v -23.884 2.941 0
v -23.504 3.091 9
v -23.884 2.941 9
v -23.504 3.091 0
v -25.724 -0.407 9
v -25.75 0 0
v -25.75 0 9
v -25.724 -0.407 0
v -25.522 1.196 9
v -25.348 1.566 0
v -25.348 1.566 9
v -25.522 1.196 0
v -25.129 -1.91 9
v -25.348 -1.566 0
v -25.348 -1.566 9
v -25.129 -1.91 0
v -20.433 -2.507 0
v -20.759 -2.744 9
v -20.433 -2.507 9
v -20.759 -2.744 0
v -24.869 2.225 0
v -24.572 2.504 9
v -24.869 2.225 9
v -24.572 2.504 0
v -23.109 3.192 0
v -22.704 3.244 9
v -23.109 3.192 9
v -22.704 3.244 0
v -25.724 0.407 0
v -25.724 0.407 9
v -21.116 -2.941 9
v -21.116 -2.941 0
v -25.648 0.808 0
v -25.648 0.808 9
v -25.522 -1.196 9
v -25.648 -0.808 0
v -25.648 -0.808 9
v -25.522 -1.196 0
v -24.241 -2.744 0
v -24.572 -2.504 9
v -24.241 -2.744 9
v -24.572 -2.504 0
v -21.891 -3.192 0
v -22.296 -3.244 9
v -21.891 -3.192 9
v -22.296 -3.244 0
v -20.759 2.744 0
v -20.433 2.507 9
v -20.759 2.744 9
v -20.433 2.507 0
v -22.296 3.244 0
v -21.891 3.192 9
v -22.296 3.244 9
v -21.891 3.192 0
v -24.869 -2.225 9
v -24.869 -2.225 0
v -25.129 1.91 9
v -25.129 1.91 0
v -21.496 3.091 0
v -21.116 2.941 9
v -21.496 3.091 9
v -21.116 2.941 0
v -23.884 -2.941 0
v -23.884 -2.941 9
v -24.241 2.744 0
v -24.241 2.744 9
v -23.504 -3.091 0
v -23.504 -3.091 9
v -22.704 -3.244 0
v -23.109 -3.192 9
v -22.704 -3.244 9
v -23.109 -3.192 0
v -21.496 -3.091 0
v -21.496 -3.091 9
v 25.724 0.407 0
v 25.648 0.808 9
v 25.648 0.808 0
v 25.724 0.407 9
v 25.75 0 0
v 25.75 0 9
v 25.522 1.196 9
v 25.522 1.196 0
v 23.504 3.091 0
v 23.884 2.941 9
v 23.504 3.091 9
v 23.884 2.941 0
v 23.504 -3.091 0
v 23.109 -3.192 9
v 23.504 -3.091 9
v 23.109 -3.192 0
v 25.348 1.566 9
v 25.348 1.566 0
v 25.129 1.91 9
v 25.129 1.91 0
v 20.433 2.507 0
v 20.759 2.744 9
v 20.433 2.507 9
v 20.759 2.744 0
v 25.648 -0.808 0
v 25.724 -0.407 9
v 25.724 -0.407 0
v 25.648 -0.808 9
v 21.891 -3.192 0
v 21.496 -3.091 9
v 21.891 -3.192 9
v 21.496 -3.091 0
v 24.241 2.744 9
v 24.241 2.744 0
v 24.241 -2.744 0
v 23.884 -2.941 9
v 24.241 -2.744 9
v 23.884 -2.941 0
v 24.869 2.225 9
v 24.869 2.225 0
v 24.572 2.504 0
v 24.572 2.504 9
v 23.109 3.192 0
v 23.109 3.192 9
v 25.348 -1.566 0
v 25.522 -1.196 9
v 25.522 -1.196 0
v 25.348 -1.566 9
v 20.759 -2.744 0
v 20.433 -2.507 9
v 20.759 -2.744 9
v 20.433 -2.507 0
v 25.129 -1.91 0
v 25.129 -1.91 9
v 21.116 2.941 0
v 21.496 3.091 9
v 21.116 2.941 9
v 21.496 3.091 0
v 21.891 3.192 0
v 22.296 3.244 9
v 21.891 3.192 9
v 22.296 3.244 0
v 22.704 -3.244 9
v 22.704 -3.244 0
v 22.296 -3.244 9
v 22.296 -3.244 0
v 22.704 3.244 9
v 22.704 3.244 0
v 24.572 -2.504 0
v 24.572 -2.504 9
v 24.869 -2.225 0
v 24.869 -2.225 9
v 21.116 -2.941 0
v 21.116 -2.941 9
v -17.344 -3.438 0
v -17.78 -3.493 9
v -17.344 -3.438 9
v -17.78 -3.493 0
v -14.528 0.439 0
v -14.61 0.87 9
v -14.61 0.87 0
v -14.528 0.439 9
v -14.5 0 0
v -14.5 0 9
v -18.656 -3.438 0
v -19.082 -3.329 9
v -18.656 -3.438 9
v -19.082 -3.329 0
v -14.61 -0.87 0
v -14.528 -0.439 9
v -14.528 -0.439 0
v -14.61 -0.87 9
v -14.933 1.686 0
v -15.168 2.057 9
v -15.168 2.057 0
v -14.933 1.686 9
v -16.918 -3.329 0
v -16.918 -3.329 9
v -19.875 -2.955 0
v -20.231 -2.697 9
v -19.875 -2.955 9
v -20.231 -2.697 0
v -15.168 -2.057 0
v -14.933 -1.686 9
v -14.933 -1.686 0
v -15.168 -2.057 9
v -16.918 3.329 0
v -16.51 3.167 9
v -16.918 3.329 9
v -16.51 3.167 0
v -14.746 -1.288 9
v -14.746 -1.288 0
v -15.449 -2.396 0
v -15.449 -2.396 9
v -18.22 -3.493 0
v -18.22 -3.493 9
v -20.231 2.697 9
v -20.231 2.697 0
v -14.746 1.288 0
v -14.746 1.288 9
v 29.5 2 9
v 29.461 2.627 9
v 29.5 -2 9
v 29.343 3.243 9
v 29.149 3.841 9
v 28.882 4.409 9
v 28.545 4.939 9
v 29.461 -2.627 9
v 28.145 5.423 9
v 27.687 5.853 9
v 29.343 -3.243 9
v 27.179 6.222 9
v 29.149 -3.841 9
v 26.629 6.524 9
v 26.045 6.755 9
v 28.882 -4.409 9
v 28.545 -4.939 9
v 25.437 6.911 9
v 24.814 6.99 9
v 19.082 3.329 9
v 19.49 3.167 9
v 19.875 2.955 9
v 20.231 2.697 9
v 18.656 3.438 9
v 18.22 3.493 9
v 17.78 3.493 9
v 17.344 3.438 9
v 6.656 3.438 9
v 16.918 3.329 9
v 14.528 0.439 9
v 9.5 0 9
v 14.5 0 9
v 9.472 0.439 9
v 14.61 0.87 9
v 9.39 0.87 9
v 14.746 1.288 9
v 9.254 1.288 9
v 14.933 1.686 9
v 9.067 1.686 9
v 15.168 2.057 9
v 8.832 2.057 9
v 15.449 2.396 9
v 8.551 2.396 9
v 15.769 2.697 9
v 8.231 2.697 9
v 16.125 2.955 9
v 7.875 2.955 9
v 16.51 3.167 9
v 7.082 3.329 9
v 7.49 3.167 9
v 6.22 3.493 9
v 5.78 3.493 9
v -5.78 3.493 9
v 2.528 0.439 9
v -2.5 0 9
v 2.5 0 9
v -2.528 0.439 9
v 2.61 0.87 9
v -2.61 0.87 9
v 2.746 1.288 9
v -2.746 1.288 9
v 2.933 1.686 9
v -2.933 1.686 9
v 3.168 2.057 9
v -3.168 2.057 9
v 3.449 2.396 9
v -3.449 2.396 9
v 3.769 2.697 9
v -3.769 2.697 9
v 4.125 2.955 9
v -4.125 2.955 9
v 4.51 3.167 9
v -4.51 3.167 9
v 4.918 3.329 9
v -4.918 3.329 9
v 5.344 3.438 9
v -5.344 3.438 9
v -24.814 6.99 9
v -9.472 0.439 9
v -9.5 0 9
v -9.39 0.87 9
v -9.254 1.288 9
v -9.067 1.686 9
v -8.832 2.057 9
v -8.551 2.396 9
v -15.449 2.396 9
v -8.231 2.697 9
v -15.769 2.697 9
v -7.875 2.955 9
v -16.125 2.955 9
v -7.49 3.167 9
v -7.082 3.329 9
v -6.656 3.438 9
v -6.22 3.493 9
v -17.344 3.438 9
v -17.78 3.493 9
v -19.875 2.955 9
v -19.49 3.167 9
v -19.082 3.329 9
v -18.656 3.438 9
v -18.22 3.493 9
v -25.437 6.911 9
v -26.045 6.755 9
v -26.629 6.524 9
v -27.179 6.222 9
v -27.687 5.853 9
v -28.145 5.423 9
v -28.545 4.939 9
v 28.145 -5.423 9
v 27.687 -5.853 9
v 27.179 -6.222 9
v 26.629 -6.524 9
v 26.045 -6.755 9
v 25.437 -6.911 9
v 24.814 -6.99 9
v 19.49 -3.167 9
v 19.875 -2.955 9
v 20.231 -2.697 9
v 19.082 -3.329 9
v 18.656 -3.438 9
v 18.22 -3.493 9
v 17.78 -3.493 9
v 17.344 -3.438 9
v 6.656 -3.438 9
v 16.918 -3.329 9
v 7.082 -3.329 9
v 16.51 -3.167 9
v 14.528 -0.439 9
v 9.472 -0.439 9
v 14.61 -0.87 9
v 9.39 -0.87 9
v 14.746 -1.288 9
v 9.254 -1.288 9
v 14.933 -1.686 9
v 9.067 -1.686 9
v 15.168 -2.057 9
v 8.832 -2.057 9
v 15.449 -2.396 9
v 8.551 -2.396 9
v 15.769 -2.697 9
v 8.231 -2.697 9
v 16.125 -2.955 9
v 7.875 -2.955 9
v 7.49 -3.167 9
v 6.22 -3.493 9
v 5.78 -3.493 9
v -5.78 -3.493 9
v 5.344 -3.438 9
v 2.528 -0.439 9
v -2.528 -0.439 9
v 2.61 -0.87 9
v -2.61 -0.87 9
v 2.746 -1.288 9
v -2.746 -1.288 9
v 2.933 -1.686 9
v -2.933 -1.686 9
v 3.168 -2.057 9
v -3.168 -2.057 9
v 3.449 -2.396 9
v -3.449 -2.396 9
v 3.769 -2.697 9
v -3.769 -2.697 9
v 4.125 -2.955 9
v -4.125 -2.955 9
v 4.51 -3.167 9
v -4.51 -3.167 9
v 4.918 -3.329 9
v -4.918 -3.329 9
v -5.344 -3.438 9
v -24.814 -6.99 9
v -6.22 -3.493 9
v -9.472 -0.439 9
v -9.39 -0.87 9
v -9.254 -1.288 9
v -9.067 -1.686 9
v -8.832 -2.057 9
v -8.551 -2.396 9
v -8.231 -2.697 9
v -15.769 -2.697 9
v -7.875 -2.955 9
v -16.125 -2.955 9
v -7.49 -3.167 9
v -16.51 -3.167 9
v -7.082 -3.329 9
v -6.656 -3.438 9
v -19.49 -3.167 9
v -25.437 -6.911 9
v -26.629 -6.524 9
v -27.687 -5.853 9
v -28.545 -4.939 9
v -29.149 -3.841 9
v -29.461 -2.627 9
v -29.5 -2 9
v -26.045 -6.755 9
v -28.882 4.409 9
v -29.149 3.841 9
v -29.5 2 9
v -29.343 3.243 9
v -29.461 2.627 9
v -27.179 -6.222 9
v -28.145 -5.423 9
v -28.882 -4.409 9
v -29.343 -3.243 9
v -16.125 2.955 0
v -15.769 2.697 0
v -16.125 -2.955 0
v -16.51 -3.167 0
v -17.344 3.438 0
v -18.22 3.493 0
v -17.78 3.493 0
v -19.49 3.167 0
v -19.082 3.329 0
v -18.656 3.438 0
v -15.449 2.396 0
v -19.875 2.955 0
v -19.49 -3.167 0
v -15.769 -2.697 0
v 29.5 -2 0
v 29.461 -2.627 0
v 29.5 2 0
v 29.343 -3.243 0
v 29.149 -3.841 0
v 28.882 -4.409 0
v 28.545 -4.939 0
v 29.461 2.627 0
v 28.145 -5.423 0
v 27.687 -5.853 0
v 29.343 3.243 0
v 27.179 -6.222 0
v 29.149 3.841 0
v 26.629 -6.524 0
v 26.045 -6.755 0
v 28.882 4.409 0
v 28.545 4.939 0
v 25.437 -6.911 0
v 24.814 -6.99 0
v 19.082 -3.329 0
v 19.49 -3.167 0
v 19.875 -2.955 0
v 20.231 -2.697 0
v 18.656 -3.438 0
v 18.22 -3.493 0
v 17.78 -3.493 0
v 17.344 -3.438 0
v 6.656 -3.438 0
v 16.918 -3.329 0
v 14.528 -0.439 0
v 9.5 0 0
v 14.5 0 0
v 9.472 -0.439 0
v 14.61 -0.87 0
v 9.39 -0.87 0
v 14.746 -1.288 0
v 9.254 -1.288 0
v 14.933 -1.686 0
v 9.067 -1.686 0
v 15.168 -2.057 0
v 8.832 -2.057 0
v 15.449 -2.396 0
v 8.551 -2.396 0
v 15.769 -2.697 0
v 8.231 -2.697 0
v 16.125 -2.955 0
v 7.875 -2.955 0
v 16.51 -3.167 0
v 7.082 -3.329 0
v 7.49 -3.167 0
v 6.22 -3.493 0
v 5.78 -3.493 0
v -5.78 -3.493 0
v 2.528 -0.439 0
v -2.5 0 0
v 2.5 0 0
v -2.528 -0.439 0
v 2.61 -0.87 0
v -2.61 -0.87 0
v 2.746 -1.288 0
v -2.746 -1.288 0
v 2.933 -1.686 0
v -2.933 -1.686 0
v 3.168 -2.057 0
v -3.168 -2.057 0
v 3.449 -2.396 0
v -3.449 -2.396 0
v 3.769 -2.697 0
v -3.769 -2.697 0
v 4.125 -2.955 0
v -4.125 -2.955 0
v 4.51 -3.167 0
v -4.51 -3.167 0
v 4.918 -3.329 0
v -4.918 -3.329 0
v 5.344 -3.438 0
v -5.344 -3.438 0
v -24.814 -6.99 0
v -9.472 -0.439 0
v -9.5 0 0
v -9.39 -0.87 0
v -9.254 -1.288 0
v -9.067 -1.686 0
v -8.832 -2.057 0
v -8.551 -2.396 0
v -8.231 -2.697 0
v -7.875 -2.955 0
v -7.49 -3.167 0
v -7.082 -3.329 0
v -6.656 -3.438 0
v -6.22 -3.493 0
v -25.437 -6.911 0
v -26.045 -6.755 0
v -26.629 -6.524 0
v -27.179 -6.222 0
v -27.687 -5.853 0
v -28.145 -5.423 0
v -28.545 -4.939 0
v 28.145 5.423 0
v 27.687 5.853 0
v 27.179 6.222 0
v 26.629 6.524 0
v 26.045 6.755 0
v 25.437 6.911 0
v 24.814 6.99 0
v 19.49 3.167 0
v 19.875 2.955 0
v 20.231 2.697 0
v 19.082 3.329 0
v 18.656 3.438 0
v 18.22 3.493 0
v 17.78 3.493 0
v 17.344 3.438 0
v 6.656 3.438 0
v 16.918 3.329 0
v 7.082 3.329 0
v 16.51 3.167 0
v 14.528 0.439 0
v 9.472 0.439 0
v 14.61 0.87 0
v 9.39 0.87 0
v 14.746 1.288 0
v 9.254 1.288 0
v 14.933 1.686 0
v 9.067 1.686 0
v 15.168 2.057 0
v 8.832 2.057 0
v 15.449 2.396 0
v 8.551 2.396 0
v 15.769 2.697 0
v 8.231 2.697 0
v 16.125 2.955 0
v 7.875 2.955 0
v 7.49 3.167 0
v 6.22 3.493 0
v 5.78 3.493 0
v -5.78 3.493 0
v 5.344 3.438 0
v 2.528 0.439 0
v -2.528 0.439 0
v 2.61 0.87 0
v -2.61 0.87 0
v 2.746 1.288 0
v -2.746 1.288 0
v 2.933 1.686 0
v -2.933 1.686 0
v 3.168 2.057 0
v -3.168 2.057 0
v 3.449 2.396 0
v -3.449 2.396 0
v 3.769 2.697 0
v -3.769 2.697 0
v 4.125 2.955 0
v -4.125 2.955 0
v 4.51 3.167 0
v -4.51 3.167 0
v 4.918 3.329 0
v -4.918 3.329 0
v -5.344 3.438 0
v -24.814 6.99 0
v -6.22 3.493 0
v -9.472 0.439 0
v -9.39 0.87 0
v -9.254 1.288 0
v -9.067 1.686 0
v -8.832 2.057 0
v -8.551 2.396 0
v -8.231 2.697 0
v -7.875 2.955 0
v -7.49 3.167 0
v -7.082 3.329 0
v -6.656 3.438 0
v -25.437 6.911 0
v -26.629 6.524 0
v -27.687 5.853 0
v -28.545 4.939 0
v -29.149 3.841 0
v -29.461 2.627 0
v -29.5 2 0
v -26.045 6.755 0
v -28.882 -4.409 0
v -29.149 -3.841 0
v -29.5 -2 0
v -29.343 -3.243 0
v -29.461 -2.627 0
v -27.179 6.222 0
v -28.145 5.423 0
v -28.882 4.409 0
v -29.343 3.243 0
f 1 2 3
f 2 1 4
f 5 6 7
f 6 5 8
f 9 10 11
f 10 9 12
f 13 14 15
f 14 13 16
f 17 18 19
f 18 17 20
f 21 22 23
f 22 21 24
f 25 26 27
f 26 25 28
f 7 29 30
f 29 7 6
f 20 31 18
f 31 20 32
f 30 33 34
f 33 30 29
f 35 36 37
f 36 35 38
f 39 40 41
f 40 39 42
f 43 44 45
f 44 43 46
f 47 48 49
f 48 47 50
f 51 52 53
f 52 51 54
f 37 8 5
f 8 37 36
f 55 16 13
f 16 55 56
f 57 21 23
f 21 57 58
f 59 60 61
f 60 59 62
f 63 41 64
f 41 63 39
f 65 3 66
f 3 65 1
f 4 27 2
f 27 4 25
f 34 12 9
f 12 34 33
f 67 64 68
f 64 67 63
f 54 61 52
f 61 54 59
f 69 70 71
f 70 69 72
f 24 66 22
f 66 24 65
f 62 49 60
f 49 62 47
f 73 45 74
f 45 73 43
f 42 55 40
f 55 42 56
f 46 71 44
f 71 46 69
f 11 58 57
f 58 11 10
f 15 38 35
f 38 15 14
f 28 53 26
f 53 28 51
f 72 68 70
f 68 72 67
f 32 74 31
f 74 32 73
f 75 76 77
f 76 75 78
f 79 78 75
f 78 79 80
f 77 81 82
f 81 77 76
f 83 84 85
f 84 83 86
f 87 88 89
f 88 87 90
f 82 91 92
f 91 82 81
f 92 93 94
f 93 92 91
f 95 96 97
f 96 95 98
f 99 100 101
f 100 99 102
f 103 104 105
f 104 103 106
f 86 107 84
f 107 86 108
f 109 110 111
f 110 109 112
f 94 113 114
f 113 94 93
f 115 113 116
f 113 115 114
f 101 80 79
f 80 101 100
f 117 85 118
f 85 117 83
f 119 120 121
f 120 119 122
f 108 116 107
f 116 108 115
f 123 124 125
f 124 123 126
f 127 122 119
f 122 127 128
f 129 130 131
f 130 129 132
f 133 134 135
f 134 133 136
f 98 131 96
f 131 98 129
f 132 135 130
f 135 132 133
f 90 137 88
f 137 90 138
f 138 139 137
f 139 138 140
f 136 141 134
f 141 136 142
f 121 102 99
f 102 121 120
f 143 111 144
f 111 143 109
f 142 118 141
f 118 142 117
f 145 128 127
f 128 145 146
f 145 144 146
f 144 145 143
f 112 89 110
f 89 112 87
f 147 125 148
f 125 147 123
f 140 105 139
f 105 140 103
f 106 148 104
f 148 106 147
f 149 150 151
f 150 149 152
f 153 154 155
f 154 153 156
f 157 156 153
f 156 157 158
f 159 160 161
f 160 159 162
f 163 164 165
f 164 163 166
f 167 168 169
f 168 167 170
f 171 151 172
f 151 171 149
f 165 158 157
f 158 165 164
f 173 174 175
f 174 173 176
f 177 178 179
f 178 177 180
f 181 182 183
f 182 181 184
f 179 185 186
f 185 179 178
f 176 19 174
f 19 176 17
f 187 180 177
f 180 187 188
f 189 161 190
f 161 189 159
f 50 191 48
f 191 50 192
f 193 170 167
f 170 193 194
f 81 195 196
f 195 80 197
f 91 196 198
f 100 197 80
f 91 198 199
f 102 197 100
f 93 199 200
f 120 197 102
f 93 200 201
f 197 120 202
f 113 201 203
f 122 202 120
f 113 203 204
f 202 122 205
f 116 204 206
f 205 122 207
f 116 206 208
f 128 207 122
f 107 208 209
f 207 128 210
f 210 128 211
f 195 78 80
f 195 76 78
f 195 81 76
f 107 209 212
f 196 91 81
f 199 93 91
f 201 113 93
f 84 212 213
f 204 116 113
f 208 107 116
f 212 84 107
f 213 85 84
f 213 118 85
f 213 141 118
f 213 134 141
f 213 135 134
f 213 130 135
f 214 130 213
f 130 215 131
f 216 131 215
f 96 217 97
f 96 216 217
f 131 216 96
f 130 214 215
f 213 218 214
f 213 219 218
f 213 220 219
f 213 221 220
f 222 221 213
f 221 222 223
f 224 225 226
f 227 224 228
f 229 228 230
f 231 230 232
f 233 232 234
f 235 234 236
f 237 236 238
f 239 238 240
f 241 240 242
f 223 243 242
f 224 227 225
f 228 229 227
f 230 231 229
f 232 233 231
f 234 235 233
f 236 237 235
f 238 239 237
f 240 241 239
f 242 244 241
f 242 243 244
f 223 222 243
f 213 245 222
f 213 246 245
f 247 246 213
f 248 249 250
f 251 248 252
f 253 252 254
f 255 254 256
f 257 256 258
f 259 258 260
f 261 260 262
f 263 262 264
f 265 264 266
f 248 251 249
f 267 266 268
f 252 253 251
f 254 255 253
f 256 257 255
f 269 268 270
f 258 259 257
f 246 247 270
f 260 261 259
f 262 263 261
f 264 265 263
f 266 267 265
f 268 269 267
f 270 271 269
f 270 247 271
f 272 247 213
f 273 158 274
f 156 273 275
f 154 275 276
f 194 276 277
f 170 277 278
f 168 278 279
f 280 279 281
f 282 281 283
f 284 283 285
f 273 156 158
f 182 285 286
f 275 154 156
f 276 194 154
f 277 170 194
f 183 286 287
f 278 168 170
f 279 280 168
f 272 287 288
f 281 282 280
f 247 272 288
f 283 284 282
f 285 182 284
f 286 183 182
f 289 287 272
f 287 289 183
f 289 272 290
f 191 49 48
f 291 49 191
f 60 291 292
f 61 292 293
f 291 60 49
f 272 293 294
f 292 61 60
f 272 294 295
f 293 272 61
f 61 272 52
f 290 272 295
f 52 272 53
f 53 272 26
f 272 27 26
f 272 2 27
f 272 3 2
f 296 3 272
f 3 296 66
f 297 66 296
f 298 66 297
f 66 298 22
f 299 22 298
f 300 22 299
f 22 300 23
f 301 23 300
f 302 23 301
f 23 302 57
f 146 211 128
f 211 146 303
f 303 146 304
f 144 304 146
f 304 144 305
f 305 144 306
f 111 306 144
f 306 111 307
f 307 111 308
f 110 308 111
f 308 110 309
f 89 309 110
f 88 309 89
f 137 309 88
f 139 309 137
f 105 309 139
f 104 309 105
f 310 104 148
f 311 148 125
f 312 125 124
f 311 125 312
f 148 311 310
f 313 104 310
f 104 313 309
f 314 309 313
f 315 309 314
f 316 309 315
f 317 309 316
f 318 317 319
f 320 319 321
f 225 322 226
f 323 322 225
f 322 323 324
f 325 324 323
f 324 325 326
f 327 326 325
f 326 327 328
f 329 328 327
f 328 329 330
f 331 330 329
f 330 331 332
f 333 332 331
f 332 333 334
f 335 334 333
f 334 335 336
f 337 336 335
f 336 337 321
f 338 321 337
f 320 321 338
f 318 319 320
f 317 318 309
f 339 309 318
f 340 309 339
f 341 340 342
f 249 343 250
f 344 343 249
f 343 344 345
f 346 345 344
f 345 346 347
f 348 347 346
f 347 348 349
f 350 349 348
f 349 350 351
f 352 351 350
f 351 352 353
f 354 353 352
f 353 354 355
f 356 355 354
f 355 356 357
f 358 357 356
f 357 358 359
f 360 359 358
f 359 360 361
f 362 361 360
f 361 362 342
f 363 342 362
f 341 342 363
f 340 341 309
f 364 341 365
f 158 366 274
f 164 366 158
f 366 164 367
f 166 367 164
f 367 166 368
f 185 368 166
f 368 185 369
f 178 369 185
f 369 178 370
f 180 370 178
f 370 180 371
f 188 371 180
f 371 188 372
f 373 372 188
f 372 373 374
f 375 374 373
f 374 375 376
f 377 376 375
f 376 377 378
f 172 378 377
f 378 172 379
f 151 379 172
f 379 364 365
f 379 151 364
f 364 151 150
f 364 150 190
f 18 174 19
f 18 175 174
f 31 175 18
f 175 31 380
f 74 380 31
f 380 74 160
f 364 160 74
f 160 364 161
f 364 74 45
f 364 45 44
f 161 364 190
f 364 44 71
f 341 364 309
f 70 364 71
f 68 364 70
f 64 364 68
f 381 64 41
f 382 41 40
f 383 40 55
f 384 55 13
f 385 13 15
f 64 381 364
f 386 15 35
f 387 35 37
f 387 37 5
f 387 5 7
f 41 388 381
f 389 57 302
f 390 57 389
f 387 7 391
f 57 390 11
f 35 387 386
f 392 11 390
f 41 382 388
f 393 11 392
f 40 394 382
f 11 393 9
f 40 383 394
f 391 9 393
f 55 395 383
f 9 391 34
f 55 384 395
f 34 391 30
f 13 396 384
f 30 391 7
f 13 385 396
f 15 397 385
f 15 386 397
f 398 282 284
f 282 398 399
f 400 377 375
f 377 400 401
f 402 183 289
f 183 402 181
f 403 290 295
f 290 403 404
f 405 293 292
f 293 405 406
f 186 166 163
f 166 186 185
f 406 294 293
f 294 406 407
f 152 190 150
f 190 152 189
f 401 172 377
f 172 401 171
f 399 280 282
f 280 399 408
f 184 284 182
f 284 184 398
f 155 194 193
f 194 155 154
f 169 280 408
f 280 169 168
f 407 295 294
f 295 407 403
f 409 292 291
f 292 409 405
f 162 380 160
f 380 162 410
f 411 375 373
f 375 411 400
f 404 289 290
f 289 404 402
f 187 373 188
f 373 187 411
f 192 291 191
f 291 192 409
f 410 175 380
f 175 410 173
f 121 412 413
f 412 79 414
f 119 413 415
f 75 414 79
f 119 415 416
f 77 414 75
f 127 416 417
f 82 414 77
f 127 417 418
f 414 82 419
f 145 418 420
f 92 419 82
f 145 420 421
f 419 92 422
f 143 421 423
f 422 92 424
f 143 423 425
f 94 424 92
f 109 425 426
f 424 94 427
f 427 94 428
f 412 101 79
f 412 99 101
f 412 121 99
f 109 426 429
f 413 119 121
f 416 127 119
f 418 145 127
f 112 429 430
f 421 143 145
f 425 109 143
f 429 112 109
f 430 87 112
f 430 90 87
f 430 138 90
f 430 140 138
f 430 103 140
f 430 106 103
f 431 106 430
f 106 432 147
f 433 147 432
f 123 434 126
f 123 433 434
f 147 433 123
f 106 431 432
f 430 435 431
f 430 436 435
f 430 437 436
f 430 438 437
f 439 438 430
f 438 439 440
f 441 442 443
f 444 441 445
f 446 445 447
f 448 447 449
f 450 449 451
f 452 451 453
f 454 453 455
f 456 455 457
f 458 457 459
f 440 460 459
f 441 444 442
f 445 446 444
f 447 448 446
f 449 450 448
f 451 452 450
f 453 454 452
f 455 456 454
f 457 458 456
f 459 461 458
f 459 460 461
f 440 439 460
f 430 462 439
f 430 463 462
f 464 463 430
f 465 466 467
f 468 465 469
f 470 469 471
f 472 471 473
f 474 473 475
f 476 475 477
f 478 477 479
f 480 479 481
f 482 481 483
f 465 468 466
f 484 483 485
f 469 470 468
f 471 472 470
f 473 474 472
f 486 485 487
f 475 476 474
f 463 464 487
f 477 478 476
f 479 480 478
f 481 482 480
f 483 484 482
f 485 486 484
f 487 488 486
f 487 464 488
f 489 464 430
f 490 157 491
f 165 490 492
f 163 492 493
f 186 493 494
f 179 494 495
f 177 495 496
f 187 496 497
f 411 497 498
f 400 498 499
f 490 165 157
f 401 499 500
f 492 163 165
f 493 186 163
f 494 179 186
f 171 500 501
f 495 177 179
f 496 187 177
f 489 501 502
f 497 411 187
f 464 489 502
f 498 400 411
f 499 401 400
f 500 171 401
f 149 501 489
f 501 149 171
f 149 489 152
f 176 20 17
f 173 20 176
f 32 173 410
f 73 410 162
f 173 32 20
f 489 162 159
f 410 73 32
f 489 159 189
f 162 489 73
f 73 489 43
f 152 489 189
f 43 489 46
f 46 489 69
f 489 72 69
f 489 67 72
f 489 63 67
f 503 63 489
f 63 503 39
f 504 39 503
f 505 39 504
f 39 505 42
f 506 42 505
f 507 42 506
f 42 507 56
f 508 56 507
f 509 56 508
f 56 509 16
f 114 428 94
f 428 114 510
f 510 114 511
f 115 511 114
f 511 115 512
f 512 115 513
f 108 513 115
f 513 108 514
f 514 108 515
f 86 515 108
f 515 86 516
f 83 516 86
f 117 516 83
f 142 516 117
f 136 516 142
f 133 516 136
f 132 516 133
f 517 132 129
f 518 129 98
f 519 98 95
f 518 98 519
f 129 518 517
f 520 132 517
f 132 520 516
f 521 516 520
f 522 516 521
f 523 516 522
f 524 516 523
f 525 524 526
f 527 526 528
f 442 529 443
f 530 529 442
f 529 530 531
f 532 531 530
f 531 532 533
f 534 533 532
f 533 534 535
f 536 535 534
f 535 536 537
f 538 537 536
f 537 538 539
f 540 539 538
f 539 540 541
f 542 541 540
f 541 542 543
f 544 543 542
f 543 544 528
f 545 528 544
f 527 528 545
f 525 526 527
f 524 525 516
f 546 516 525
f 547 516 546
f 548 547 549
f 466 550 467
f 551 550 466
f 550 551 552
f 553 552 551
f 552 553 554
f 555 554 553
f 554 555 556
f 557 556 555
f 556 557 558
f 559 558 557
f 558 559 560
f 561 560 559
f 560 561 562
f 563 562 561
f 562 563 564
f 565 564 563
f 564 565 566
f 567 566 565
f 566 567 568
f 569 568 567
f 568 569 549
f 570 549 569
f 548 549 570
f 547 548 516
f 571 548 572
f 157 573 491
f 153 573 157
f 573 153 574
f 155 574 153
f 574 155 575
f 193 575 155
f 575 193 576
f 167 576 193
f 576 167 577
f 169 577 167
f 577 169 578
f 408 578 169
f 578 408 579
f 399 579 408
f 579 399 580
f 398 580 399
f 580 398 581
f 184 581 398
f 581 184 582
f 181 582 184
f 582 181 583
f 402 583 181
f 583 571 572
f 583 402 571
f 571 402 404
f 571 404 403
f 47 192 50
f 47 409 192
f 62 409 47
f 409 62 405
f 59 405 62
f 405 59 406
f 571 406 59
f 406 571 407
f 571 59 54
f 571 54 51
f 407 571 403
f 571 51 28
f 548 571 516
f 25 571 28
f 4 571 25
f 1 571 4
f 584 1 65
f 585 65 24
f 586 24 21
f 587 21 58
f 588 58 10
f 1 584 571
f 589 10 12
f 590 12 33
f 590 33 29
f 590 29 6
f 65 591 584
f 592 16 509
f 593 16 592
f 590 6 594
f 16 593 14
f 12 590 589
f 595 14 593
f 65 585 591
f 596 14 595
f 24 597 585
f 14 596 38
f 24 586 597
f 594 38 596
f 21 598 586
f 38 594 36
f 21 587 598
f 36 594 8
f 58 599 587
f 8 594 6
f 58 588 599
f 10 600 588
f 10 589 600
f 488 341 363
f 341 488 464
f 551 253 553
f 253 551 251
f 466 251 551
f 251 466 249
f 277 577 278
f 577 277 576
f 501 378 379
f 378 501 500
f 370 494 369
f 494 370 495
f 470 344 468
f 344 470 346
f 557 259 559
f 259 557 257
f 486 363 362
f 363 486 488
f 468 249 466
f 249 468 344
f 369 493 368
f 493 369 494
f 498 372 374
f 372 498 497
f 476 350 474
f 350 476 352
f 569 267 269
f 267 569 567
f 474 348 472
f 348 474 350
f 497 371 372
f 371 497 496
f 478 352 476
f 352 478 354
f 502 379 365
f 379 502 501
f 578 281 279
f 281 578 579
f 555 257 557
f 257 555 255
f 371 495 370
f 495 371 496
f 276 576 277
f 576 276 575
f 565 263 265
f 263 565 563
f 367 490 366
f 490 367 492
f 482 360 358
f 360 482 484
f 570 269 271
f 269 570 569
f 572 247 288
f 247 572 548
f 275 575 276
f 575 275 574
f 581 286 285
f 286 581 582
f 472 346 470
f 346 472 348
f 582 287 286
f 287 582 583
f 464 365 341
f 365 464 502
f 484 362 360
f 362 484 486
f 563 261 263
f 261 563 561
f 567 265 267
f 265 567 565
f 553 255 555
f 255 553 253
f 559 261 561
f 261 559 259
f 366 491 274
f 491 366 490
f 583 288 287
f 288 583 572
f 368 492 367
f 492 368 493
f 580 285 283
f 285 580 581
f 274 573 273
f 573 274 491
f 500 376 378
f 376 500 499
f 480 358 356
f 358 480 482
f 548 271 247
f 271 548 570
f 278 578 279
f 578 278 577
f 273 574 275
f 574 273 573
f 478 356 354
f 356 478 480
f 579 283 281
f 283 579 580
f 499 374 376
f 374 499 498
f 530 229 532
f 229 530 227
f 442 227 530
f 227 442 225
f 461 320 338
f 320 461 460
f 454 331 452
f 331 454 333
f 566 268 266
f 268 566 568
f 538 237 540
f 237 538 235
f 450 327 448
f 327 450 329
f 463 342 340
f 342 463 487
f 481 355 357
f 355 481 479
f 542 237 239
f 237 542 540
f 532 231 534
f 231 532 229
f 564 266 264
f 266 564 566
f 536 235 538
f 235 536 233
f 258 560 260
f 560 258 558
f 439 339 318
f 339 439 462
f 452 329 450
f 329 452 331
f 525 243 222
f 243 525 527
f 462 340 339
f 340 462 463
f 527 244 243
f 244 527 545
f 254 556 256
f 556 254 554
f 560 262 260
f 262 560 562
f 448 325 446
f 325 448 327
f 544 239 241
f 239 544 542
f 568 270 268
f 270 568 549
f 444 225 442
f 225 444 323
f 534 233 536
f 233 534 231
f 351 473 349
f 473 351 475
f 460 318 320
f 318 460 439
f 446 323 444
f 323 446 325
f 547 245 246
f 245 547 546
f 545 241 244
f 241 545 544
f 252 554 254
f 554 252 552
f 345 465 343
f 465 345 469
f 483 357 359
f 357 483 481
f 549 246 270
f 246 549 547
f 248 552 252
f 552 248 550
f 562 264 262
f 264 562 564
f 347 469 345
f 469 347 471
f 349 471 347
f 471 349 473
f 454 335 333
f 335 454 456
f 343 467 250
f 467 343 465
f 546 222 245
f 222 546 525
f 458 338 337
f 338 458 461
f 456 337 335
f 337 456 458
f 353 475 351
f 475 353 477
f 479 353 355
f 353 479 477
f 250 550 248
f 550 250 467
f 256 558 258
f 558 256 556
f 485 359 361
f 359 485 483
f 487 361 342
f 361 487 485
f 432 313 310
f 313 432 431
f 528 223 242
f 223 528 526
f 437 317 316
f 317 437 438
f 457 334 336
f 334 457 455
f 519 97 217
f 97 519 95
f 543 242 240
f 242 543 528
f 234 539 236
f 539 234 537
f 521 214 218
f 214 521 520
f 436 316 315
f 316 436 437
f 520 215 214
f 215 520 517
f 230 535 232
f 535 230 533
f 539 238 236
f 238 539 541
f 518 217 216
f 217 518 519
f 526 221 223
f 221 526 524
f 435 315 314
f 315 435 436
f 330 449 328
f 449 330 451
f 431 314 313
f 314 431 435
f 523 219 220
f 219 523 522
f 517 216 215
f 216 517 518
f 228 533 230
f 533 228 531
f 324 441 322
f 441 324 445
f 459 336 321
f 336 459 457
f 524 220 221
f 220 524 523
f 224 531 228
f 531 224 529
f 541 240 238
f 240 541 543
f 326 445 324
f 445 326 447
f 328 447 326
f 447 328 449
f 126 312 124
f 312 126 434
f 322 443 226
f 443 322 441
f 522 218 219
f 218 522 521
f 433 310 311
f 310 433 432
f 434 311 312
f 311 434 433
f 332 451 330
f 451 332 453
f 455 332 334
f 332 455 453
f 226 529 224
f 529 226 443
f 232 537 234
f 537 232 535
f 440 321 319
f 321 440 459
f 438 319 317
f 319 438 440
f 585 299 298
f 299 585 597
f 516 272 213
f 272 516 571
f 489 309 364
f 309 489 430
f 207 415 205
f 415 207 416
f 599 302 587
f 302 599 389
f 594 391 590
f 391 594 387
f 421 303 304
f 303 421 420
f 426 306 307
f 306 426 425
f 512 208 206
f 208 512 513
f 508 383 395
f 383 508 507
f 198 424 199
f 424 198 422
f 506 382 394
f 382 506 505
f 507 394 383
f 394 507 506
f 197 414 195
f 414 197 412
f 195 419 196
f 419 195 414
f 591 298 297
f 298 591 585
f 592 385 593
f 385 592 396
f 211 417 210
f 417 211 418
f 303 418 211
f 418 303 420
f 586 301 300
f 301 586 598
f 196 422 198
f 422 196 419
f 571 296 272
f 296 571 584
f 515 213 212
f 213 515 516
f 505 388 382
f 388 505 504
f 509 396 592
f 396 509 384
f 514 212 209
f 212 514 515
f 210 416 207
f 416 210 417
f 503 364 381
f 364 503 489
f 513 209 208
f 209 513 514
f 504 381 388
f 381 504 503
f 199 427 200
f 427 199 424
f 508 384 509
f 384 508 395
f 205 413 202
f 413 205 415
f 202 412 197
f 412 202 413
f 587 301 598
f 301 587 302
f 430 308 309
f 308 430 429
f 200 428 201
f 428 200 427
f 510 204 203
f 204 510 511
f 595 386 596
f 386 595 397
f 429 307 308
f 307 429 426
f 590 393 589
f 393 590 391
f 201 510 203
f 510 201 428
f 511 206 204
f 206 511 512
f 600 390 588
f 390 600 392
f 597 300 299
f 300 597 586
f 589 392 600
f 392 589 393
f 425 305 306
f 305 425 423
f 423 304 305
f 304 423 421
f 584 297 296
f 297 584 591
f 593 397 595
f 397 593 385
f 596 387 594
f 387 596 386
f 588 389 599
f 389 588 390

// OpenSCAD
$fn = 50;

difference() {
	union() {
		hull() {
			translate(v = [-24.5, 2.0, 0]) {
				cylinder(h = 9, r = 5);
			}
			translate(v = [24.5, 2.0, 0]) {
				cylinder(h = 9, r = 5);
			}
			translate(v = [-24.5, -2.0, 0]) {
				cylinder(h = 9, r = 5);
			}
			translate(v = [24.5, -2.0, 0]) {
				cylinder(h = 9, r = 5);
			}
		}
	}
	union() {
		translate(v = [-22.5, 0.0, -100.0]) {
			cylinder(h = 200, r = 3.25);
		}
		translate(v = [22.5, 0.0, -100.0]) {
			cylinder(h = 200, r = 3.25);
		}
		translate(v = [-22.5, 0.0, -100.0]) {
			cylinder(h = 200, r = 1.8);
		}
		translate(v = [22.5, 0.0, -100.0]) {
			cylinder(h = 200, r = 1.8);
		}
		translate(v = [-18.0, 0, 0.0]) {
			cylinder(h = 9, r = 3.5);
		}
		translate(v = [-6.0, 0, 0.0]) {
			cylinder(h = 9, r = 3.5);
		}
		translate(v = [6.0, 0, 0.0]) {
			cylinder(h = 9, r = 3.5);
		}
		translate(v = [18.0, 0, 0.0]) {
			cylinder(h = 9, r = 3.5);
		}
	}
}
